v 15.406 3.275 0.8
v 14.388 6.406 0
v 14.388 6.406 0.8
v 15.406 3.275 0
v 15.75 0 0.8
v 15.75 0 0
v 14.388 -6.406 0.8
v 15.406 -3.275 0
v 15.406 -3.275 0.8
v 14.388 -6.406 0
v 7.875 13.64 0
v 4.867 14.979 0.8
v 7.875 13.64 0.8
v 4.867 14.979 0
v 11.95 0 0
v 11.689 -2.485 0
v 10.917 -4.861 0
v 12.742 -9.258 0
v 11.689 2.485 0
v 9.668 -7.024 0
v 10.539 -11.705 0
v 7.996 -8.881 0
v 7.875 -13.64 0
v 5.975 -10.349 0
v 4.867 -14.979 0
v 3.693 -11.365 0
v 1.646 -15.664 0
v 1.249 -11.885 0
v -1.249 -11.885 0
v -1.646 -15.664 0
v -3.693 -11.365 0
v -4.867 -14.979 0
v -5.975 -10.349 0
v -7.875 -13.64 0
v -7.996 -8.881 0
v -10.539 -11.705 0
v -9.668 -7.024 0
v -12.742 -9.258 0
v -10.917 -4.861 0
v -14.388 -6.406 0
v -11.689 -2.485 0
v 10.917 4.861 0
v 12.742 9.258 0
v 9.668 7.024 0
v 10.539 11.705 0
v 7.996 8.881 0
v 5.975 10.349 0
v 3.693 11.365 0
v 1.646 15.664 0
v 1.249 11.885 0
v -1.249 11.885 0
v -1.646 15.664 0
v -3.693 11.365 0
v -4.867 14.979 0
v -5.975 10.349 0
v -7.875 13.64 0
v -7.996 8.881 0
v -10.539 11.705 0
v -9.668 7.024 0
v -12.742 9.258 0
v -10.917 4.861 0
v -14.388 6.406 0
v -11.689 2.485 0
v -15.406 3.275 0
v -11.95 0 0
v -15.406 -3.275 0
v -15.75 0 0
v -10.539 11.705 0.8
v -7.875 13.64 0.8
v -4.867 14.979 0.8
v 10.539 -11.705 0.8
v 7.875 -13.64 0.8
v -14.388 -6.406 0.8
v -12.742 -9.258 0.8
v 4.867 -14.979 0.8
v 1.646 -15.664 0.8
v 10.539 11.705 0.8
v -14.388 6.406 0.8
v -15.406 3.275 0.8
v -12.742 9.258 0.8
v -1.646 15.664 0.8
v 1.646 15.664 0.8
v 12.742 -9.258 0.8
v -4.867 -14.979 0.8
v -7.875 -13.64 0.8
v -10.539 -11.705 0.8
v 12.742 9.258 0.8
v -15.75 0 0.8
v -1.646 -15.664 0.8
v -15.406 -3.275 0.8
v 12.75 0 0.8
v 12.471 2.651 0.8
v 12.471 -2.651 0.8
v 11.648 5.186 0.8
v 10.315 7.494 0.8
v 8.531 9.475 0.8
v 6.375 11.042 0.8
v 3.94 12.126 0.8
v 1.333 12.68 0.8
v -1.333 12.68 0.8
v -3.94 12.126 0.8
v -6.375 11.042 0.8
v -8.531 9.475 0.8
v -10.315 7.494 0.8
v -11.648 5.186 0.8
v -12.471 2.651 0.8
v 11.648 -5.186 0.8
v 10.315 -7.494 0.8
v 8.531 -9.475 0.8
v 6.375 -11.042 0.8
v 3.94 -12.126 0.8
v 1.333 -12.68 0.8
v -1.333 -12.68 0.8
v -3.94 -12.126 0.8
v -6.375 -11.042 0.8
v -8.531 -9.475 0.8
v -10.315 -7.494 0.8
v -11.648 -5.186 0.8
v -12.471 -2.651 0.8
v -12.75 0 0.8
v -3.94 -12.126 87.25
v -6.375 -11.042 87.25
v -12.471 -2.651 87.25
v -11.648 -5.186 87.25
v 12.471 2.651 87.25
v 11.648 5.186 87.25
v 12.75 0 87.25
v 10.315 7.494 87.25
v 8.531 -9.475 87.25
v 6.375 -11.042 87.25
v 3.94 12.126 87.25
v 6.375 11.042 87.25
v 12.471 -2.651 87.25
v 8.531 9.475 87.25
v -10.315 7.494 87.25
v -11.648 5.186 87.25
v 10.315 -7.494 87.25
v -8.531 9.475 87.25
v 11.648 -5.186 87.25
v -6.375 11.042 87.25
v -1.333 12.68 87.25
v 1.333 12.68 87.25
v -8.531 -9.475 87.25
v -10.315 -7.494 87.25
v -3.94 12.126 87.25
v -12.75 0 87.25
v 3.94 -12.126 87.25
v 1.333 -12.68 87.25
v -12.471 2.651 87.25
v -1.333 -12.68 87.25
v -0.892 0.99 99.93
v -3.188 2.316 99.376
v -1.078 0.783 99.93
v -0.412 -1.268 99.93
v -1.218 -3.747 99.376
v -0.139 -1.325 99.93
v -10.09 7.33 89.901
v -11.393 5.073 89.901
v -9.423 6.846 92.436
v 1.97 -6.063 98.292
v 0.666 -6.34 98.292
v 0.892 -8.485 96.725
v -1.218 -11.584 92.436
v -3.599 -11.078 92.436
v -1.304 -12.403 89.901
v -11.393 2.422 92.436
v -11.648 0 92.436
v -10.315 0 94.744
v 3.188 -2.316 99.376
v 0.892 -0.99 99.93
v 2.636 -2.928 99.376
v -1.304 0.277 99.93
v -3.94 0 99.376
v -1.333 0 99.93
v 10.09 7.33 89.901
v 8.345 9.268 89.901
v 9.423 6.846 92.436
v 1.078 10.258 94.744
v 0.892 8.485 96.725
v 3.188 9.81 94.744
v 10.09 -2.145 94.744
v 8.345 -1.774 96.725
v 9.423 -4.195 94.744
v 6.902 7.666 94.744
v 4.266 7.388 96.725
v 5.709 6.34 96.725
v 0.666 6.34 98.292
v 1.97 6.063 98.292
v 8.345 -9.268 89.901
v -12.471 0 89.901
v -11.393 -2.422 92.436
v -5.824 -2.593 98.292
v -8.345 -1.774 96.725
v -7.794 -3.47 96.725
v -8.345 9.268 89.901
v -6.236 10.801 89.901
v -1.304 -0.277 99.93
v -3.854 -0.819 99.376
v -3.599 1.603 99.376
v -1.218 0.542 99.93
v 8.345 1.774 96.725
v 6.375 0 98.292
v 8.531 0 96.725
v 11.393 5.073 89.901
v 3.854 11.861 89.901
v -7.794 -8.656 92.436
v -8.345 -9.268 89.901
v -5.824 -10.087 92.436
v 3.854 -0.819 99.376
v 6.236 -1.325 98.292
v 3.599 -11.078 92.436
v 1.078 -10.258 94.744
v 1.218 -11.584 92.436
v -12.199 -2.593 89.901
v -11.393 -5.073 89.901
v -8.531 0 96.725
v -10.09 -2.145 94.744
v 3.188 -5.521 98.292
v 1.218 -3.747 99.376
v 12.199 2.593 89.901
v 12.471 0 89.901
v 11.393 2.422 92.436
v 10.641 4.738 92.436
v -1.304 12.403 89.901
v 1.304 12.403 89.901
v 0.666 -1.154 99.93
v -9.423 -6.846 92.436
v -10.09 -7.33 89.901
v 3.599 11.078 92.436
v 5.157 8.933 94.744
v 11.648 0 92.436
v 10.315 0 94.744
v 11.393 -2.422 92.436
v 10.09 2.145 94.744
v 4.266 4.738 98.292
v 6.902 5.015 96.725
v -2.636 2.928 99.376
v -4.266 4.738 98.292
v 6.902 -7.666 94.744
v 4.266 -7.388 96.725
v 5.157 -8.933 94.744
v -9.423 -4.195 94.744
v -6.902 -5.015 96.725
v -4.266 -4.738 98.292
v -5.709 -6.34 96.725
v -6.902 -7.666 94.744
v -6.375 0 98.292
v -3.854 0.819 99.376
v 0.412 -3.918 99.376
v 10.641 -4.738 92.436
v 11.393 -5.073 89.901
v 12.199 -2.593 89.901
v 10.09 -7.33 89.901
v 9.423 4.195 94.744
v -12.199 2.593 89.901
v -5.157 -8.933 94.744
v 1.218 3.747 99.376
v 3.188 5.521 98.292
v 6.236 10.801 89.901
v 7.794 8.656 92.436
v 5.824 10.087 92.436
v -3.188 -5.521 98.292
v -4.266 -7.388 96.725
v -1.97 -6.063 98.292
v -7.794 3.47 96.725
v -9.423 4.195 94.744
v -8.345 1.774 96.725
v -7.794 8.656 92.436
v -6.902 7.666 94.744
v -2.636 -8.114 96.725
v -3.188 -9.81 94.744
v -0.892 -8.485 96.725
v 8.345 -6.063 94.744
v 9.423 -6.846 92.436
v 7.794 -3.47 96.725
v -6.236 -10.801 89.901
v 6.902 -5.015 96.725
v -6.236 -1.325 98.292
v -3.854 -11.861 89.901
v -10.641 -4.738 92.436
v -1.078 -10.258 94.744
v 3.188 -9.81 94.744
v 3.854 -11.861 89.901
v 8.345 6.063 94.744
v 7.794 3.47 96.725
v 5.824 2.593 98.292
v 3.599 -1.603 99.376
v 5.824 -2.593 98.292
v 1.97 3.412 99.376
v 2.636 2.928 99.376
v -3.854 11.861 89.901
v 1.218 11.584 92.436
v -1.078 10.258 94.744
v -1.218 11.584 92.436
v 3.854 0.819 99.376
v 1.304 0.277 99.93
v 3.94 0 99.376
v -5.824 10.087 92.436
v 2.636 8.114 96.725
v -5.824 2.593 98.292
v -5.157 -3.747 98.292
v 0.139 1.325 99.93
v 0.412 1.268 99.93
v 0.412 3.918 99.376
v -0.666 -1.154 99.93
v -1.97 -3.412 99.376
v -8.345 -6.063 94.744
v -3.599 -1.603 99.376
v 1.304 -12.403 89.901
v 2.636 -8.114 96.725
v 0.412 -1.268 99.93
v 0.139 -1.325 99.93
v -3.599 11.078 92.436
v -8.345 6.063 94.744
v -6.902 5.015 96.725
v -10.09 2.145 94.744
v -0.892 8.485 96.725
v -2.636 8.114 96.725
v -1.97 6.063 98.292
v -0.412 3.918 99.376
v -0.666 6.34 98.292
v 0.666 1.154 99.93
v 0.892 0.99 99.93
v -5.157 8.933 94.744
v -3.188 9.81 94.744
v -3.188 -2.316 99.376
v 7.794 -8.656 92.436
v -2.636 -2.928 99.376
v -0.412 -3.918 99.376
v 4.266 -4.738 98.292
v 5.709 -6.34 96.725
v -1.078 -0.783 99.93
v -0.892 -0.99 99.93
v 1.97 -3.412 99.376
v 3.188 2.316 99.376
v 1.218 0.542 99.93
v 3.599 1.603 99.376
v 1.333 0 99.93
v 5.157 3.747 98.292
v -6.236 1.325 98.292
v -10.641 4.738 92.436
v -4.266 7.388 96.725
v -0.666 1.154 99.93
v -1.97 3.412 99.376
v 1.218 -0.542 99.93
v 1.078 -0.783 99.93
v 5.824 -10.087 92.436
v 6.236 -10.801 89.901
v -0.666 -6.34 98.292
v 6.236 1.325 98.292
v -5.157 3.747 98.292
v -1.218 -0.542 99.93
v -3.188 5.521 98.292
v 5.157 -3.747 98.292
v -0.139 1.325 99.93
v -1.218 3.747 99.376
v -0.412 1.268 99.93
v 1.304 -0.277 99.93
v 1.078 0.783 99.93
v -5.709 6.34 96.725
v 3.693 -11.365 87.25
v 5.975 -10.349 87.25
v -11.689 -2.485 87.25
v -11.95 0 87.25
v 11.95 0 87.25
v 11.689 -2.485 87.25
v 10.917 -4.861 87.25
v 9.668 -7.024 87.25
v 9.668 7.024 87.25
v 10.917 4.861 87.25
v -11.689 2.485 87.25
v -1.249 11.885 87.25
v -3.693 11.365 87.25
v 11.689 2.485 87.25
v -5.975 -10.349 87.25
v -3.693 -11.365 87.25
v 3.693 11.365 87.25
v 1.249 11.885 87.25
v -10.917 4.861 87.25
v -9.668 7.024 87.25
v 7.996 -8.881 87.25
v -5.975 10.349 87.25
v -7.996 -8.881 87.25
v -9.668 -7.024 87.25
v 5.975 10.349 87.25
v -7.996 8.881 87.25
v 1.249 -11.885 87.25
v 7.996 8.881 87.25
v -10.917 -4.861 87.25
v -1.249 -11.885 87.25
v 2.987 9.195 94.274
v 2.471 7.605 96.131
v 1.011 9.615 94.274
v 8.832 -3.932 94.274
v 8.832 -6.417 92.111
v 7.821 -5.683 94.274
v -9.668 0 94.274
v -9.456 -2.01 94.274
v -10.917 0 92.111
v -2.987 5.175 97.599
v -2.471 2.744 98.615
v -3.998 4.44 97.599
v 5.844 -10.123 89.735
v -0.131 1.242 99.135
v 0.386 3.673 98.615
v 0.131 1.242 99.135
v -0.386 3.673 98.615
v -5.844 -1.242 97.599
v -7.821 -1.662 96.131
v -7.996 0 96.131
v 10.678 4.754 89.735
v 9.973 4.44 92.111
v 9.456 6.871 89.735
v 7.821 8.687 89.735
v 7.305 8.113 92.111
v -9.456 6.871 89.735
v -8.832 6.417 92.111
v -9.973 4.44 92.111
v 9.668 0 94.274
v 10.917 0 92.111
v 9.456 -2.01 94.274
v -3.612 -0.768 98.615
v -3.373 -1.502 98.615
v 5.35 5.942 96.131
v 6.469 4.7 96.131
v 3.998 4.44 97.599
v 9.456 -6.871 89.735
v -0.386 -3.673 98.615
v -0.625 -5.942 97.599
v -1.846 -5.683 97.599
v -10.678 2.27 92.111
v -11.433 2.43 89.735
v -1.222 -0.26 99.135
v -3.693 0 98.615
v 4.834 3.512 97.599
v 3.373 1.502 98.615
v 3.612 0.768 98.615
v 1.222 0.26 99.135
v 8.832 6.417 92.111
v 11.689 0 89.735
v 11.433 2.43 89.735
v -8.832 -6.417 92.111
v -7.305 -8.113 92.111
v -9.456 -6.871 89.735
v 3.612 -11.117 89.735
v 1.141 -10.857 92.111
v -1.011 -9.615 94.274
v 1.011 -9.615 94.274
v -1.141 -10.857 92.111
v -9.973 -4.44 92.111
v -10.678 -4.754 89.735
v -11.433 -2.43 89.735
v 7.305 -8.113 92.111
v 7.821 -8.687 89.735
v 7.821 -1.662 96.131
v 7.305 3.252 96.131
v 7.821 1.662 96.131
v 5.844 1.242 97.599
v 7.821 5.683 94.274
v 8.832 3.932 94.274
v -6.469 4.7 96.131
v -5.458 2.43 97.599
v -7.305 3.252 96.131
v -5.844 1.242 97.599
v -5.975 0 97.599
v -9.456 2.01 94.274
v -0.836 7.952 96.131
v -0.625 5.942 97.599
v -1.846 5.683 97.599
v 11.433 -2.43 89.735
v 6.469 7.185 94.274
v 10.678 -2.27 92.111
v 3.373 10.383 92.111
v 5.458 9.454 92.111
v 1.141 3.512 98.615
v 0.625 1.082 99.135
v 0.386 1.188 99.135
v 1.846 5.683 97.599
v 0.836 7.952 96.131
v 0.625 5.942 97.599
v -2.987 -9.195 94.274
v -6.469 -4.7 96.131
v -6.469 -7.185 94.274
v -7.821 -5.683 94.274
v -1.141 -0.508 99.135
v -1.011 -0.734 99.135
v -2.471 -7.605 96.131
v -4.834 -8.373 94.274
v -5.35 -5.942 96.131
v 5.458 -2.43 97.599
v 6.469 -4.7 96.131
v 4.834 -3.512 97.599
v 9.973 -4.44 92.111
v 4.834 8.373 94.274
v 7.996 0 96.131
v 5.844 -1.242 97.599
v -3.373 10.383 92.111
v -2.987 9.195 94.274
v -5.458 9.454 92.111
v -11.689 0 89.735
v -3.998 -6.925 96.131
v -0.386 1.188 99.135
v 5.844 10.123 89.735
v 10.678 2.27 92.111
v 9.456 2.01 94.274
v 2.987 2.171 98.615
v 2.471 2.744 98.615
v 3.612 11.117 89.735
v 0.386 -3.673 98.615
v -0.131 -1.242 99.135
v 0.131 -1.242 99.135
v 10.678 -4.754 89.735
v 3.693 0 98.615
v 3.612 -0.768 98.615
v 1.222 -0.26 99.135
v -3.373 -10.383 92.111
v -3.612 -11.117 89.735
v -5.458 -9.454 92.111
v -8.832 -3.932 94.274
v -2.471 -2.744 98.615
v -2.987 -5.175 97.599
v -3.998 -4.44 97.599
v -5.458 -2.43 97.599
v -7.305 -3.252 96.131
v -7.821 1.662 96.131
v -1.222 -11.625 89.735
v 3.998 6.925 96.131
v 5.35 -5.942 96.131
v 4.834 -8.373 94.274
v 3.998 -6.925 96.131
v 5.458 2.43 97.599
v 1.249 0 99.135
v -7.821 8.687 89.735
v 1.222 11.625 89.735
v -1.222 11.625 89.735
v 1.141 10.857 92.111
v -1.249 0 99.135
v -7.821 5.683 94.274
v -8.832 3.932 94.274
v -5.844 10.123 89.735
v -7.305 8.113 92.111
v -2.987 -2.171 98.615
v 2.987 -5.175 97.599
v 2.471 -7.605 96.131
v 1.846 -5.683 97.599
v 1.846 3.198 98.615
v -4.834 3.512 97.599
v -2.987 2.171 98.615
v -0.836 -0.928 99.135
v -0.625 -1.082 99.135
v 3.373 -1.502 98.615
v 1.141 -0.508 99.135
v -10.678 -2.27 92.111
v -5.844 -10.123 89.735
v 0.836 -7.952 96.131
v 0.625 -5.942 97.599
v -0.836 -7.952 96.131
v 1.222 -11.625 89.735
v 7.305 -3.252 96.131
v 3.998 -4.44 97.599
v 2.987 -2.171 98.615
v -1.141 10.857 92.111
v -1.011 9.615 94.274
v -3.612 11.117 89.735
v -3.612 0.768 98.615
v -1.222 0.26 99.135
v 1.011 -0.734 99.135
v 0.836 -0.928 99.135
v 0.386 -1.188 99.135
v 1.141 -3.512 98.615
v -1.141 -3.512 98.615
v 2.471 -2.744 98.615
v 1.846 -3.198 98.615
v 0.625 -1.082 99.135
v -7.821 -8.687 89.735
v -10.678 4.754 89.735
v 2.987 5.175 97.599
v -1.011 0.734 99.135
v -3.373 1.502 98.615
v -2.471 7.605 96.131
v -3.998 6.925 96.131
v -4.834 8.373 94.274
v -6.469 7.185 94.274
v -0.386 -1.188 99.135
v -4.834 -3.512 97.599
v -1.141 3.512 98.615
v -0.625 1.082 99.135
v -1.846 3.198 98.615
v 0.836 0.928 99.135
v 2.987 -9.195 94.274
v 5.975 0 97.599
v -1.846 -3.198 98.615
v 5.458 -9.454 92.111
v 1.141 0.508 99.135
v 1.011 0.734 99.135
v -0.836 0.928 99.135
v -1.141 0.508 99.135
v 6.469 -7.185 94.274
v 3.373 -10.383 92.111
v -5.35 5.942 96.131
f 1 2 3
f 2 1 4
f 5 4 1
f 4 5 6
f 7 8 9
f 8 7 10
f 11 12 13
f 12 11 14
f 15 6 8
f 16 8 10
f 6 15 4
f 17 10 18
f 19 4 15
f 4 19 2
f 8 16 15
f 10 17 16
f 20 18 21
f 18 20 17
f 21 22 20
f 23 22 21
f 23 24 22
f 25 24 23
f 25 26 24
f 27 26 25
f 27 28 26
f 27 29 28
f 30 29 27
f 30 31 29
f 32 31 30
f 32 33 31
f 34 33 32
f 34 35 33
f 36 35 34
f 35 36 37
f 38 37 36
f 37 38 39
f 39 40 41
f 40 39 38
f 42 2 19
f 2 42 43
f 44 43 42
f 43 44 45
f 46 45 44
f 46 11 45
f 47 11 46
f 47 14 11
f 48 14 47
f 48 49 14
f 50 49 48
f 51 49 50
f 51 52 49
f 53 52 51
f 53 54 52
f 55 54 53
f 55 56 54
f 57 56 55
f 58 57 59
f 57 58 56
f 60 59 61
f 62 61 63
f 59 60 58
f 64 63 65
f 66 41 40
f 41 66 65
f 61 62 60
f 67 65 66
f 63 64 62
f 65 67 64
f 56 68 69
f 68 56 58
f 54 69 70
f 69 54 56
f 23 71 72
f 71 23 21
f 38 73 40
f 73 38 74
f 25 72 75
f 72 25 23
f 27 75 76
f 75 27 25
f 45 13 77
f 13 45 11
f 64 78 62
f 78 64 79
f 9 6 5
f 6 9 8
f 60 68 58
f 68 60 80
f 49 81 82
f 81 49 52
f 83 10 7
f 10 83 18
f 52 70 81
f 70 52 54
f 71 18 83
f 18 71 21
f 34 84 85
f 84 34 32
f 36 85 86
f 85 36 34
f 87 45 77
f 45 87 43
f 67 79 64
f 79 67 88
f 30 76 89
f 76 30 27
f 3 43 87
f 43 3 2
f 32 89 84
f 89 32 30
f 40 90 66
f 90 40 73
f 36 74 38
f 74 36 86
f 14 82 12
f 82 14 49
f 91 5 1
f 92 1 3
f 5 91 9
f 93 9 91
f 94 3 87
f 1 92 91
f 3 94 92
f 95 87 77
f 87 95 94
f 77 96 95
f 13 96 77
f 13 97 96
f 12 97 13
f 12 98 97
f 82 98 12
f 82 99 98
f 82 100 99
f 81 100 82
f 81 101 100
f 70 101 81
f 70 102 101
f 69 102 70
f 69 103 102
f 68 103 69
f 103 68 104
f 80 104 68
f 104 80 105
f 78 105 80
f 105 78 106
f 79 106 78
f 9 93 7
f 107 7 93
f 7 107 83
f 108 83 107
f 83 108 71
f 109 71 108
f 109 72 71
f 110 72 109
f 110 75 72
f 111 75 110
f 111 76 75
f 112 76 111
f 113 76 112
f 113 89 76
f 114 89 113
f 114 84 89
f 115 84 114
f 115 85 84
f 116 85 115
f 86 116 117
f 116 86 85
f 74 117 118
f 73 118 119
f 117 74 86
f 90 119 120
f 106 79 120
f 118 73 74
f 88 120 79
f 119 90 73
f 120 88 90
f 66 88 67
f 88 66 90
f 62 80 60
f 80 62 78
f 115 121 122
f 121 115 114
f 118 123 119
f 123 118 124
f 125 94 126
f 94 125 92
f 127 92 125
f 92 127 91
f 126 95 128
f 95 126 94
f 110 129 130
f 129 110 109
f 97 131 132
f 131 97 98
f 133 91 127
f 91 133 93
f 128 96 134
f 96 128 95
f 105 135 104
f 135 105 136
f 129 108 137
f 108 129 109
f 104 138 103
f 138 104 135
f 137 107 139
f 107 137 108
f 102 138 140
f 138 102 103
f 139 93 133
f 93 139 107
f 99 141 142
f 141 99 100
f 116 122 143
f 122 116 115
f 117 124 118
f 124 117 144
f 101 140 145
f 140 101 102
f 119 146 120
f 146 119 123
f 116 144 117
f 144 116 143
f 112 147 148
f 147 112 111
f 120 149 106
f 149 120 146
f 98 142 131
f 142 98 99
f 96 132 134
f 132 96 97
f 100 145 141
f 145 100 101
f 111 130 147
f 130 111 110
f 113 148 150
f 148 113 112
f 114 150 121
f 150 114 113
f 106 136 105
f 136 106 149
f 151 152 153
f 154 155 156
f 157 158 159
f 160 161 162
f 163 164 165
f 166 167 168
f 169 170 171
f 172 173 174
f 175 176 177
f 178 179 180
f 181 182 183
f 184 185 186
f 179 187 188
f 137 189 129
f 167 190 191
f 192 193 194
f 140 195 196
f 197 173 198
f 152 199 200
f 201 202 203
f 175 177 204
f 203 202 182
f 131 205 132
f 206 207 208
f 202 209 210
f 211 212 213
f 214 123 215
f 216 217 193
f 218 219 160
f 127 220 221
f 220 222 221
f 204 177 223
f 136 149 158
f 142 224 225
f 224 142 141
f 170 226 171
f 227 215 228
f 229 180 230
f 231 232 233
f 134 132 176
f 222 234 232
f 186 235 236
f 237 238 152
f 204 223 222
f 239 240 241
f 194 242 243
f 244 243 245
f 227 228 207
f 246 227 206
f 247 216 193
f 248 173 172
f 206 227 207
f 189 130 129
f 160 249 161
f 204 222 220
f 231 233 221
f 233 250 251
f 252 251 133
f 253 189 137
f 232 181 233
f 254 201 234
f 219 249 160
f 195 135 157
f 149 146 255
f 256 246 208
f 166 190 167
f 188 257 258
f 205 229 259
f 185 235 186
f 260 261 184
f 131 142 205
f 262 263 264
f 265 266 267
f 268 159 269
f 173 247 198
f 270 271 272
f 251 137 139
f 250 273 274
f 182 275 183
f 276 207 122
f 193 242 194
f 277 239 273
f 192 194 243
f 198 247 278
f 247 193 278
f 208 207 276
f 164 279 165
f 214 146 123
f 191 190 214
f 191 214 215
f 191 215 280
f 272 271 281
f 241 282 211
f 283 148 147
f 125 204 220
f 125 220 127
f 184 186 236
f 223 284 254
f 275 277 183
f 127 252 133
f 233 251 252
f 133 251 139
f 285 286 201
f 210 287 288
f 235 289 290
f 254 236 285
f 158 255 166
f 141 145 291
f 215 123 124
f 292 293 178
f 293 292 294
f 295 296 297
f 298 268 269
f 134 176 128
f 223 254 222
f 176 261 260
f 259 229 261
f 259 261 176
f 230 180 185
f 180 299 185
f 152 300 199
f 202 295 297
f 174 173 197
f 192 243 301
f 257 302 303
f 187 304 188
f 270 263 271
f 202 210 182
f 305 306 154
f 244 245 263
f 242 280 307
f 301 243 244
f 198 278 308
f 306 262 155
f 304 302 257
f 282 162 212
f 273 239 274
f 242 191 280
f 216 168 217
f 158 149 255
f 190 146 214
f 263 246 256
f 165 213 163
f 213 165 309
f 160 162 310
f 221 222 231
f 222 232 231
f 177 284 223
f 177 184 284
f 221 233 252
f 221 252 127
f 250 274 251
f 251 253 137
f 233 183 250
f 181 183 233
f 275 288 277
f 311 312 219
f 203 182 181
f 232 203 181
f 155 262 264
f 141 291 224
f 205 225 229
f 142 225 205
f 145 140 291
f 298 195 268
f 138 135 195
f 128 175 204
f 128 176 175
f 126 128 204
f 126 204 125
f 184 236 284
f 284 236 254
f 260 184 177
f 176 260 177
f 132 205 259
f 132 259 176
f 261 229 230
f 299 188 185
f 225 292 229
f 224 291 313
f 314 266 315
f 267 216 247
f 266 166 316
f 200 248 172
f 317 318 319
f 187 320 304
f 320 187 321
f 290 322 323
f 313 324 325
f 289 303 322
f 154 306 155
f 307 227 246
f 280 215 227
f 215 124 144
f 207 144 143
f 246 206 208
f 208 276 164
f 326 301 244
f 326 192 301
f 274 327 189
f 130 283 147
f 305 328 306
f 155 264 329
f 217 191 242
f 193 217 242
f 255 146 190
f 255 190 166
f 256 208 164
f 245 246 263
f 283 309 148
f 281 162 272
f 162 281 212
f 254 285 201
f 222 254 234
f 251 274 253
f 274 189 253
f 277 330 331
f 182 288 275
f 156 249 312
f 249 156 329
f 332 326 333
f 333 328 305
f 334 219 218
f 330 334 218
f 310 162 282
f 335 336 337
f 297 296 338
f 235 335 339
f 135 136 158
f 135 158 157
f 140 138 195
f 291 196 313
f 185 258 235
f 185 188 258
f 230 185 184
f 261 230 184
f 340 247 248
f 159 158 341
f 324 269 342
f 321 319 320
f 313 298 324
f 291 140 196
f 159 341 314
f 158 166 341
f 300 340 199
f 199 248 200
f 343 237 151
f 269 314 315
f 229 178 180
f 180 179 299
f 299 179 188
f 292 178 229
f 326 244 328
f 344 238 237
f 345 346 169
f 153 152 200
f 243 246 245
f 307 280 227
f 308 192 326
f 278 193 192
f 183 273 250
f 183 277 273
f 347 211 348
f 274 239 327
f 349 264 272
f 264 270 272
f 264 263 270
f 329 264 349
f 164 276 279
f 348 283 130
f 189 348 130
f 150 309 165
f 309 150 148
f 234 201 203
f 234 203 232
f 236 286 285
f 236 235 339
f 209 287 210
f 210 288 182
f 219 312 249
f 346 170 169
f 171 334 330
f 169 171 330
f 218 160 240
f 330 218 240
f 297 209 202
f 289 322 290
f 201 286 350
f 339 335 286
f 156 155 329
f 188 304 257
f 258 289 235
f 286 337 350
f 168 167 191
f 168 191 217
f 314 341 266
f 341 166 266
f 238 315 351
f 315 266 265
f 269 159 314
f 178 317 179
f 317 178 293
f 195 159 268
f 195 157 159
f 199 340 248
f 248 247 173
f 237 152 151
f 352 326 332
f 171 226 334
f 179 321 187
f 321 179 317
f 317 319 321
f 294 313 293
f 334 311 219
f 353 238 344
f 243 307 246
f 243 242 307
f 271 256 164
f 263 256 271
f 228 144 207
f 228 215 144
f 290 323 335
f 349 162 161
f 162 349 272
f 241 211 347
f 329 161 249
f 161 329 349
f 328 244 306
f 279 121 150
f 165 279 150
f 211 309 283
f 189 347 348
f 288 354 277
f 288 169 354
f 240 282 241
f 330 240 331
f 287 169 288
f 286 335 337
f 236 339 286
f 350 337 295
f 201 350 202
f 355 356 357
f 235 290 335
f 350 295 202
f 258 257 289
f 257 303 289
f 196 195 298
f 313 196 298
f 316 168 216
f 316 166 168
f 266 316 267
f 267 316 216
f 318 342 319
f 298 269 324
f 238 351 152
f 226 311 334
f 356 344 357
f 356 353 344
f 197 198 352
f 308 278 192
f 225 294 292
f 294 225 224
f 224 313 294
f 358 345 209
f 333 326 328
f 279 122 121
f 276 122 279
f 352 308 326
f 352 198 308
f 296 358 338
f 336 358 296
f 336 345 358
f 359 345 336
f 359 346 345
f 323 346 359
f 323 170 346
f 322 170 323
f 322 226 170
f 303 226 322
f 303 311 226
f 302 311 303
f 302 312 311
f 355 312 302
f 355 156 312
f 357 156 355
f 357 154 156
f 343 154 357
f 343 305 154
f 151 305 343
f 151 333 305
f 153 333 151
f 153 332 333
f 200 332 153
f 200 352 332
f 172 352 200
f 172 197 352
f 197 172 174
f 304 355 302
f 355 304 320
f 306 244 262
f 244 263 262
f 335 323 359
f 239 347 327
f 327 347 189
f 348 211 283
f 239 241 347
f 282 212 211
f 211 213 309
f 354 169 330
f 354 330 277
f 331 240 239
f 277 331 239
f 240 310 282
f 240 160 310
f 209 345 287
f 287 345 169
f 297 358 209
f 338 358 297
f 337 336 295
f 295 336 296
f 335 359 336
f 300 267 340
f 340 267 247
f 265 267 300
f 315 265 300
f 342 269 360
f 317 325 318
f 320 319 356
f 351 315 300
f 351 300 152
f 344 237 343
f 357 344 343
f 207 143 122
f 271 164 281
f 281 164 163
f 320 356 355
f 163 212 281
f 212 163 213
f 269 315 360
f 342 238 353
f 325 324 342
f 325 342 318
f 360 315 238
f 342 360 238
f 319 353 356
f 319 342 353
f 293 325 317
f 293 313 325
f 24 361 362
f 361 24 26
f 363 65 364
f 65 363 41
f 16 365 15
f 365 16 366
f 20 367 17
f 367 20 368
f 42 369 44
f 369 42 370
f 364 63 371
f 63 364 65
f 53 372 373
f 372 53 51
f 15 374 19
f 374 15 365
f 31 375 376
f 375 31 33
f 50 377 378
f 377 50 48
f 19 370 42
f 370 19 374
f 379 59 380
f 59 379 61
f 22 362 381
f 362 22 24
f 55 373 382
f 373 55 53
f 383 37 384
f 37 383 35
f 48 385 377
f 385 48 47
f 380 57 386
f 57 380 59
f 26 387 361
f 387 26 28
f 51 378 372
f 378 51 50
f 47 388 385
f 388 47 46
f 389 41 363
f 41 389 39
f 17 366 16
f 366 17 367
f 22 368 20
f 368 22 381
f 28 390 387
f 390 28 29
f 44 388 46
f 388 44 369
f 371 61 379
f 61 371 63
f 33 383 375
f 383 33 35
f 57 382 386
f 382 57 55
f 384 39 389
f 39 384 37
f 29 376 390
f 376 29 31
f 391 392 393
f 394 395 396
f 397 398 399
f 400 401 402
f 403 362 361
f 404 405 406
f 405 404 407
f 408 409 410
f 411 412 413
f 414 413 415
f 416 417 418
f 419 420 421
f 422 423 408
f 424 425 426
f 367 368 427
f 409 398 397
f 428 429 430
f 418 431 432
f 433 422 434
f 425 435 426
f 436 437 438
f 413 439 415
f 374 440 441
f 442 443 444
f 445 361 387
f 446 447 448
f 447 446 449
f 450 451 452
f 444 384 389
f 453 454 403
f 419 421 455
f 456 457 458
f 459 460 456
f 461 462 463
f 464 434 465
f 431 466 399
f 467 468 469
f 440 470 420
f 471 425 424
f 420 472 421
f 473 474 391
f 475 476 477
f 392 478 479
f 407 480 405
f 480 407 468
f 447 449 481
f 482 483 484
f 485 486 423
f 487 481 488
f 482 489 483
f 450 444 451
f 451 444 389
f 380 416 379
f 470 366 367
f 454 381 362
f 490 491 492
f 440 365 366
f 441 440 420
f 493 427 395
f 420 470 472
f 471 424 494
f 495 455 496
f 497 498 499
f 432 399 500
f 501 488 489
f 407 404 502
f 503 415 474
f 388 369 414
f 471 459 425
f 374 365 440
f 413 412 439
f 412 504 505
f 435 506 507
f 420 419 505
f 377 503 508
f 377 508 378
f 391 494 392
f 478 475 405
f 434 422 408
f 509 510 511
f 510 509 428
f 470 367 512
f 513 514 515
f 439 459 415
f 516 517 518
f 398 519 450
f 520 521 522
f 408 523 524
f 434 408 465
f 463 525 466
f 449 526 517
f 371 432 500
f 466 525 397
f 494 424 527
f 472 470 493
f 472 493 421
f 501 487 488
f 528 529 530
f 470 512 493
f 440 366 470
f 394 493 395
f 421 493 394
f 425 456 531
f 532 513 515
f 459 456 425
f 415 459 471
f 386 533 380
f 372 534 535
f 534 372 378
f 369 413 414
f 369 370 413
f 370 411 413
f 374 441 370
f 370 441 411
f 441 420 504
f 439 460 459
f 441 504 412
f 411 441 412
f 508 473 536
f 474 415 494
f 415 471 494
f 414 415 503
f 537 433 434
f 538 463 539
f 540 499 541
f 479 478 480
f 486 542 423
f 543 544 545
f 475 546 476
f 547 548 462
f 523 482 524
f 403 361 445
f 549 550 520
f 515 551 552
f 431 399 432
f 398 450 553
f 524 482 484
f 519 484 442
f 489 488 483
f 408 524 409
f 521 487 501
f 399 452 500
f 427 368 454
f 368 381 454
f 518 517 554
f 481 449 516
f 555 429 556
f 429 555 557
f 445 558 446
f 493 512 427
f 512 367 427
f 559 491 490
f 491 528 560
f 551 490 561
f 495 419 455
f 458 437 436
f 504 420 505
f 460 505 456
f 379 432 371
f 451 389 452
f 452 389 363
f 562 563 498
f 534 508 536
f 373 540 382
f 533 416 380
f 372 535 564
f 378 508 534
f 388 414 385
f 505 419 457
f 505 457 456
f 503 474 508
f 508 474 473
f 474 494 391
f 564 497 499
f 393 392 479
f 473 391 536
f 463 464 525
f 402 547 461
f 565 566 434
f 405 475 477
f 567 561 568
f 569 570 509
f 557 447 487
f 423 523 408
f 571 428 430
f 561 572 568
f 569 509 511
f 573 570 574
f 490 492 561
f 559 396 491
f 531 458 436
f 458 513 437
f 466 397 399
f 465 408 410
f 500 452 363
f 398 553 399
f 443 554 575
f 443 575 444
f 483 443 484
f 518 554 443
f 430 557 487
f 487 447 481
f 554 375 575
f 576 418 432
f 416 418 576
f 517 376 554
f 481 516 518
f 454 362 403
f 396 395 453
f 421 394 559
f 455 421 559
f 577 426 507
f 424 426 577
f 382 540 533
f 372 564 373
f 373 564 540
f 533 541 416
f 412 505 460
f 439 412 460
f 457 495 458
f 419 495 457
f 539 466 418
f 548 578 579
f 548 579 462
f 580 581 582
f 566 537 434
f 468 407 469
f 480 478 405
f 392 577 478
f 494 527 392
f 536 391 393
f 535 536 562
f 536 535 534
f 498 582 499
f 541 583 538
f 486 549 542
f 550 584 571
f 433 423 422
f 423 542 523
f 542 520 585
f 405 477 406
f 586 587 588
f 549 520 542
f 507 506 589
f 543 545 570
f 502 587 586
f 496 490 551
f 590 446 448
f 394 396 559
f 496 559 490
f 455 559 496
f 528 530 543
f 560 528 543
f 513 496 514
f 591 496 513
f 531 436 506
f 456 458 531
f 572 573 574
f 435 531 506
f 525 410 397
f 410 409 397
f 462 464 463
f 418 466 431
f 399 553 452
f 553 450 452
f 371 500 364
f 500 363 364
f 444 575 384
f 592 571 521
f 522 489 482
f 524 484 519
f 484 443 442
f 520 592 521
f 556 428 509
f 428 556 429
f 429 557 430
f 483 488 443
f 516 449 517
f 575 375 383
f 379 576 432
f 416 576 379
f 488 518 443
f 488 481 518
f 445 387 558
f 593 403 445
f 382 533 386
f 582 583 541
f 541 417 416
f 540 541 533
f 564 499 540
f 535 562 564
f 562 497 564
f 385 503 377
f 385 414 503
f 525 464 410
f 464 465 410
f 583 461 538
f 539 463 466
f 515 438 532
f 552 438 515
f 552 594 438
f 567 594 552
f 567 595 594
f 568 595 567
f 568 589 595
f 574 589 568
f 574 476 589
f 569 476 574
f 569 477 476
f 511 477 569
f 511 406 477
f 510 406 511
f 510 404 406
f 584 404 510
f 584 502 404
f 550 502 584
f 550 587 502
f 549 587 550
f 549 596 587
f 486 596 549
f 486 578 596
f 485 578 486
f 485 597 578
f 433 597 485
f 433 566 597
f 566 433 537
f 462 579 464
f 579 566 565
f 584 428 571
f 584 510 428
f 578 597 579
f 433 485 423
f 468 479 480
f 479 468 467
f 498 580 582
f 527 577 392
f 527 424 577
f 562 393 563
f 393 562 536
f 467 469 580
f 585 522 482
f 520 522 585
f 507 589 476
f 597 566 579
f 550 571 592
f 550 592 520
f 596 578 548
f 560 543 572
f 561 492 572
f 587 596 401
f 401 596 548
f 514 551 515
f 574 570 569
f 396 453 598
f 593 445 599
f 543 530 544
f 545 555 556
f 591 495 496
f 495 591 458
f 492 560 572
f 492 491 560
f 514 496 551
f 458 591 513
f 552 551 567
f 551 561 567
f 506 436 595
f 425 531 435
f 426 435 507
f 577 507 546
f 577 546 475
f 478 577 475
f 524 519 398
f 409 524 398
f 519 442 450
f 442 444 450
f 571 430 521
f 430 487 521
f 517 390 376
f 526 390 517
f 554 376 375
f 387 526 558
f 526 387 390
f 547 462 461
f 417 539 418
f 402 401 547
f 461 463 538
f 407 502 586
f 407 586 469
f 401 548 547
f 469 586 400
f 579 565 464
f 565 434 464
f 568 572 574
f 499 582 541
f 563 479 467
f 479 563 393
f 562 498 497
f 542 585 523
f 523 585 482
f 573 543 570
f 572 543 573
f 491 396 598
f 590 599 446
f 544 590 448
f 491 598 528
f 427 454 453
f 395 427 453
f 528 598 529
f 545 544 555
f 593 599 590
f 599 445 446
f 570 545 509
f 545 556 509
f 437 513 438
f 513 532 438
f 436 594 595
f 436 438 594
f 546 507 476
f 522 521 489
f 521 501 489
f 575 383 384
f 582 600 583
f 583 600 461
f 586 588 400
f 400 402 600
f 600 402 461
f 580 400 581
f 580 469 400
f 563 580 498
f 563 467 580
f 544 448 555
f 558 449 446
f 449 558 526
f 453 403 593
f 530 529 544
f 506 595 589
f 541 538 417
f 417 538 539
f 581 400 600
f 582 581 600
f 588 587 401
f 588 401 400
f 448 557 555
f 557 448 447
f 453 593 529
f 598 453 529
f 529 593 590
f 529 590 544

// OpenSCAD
/* [Global] */

//Diametro esterno tubo
dia=25.5;
//Altezzo totale
h=100;

/* [Altro] */
//Spessore pareti
sp2=0.8; //[0.8,1.6,2.4]
//Allargamento all'appoggio
t=6; // [2:minimo, 6:medio, 10:abbondante]
//Spessore allargamento
sp1=0.8; //[0.8,1.6,2.4]

difference(){
    union(){
cylinder(sp1,d1=dia+t,d2=dia+t);
cylinder(h-dia/2,d1=dia,d2=dia);
translate([0,0,h-dia/2])sphere(dia/2);
    }
cylinder(h-dia/2,d1=dia-sp2*2,d2=dia-sp2*2);
translate([0,0,h-dia/2])sphere((dia-sp2*2)/2);
}
